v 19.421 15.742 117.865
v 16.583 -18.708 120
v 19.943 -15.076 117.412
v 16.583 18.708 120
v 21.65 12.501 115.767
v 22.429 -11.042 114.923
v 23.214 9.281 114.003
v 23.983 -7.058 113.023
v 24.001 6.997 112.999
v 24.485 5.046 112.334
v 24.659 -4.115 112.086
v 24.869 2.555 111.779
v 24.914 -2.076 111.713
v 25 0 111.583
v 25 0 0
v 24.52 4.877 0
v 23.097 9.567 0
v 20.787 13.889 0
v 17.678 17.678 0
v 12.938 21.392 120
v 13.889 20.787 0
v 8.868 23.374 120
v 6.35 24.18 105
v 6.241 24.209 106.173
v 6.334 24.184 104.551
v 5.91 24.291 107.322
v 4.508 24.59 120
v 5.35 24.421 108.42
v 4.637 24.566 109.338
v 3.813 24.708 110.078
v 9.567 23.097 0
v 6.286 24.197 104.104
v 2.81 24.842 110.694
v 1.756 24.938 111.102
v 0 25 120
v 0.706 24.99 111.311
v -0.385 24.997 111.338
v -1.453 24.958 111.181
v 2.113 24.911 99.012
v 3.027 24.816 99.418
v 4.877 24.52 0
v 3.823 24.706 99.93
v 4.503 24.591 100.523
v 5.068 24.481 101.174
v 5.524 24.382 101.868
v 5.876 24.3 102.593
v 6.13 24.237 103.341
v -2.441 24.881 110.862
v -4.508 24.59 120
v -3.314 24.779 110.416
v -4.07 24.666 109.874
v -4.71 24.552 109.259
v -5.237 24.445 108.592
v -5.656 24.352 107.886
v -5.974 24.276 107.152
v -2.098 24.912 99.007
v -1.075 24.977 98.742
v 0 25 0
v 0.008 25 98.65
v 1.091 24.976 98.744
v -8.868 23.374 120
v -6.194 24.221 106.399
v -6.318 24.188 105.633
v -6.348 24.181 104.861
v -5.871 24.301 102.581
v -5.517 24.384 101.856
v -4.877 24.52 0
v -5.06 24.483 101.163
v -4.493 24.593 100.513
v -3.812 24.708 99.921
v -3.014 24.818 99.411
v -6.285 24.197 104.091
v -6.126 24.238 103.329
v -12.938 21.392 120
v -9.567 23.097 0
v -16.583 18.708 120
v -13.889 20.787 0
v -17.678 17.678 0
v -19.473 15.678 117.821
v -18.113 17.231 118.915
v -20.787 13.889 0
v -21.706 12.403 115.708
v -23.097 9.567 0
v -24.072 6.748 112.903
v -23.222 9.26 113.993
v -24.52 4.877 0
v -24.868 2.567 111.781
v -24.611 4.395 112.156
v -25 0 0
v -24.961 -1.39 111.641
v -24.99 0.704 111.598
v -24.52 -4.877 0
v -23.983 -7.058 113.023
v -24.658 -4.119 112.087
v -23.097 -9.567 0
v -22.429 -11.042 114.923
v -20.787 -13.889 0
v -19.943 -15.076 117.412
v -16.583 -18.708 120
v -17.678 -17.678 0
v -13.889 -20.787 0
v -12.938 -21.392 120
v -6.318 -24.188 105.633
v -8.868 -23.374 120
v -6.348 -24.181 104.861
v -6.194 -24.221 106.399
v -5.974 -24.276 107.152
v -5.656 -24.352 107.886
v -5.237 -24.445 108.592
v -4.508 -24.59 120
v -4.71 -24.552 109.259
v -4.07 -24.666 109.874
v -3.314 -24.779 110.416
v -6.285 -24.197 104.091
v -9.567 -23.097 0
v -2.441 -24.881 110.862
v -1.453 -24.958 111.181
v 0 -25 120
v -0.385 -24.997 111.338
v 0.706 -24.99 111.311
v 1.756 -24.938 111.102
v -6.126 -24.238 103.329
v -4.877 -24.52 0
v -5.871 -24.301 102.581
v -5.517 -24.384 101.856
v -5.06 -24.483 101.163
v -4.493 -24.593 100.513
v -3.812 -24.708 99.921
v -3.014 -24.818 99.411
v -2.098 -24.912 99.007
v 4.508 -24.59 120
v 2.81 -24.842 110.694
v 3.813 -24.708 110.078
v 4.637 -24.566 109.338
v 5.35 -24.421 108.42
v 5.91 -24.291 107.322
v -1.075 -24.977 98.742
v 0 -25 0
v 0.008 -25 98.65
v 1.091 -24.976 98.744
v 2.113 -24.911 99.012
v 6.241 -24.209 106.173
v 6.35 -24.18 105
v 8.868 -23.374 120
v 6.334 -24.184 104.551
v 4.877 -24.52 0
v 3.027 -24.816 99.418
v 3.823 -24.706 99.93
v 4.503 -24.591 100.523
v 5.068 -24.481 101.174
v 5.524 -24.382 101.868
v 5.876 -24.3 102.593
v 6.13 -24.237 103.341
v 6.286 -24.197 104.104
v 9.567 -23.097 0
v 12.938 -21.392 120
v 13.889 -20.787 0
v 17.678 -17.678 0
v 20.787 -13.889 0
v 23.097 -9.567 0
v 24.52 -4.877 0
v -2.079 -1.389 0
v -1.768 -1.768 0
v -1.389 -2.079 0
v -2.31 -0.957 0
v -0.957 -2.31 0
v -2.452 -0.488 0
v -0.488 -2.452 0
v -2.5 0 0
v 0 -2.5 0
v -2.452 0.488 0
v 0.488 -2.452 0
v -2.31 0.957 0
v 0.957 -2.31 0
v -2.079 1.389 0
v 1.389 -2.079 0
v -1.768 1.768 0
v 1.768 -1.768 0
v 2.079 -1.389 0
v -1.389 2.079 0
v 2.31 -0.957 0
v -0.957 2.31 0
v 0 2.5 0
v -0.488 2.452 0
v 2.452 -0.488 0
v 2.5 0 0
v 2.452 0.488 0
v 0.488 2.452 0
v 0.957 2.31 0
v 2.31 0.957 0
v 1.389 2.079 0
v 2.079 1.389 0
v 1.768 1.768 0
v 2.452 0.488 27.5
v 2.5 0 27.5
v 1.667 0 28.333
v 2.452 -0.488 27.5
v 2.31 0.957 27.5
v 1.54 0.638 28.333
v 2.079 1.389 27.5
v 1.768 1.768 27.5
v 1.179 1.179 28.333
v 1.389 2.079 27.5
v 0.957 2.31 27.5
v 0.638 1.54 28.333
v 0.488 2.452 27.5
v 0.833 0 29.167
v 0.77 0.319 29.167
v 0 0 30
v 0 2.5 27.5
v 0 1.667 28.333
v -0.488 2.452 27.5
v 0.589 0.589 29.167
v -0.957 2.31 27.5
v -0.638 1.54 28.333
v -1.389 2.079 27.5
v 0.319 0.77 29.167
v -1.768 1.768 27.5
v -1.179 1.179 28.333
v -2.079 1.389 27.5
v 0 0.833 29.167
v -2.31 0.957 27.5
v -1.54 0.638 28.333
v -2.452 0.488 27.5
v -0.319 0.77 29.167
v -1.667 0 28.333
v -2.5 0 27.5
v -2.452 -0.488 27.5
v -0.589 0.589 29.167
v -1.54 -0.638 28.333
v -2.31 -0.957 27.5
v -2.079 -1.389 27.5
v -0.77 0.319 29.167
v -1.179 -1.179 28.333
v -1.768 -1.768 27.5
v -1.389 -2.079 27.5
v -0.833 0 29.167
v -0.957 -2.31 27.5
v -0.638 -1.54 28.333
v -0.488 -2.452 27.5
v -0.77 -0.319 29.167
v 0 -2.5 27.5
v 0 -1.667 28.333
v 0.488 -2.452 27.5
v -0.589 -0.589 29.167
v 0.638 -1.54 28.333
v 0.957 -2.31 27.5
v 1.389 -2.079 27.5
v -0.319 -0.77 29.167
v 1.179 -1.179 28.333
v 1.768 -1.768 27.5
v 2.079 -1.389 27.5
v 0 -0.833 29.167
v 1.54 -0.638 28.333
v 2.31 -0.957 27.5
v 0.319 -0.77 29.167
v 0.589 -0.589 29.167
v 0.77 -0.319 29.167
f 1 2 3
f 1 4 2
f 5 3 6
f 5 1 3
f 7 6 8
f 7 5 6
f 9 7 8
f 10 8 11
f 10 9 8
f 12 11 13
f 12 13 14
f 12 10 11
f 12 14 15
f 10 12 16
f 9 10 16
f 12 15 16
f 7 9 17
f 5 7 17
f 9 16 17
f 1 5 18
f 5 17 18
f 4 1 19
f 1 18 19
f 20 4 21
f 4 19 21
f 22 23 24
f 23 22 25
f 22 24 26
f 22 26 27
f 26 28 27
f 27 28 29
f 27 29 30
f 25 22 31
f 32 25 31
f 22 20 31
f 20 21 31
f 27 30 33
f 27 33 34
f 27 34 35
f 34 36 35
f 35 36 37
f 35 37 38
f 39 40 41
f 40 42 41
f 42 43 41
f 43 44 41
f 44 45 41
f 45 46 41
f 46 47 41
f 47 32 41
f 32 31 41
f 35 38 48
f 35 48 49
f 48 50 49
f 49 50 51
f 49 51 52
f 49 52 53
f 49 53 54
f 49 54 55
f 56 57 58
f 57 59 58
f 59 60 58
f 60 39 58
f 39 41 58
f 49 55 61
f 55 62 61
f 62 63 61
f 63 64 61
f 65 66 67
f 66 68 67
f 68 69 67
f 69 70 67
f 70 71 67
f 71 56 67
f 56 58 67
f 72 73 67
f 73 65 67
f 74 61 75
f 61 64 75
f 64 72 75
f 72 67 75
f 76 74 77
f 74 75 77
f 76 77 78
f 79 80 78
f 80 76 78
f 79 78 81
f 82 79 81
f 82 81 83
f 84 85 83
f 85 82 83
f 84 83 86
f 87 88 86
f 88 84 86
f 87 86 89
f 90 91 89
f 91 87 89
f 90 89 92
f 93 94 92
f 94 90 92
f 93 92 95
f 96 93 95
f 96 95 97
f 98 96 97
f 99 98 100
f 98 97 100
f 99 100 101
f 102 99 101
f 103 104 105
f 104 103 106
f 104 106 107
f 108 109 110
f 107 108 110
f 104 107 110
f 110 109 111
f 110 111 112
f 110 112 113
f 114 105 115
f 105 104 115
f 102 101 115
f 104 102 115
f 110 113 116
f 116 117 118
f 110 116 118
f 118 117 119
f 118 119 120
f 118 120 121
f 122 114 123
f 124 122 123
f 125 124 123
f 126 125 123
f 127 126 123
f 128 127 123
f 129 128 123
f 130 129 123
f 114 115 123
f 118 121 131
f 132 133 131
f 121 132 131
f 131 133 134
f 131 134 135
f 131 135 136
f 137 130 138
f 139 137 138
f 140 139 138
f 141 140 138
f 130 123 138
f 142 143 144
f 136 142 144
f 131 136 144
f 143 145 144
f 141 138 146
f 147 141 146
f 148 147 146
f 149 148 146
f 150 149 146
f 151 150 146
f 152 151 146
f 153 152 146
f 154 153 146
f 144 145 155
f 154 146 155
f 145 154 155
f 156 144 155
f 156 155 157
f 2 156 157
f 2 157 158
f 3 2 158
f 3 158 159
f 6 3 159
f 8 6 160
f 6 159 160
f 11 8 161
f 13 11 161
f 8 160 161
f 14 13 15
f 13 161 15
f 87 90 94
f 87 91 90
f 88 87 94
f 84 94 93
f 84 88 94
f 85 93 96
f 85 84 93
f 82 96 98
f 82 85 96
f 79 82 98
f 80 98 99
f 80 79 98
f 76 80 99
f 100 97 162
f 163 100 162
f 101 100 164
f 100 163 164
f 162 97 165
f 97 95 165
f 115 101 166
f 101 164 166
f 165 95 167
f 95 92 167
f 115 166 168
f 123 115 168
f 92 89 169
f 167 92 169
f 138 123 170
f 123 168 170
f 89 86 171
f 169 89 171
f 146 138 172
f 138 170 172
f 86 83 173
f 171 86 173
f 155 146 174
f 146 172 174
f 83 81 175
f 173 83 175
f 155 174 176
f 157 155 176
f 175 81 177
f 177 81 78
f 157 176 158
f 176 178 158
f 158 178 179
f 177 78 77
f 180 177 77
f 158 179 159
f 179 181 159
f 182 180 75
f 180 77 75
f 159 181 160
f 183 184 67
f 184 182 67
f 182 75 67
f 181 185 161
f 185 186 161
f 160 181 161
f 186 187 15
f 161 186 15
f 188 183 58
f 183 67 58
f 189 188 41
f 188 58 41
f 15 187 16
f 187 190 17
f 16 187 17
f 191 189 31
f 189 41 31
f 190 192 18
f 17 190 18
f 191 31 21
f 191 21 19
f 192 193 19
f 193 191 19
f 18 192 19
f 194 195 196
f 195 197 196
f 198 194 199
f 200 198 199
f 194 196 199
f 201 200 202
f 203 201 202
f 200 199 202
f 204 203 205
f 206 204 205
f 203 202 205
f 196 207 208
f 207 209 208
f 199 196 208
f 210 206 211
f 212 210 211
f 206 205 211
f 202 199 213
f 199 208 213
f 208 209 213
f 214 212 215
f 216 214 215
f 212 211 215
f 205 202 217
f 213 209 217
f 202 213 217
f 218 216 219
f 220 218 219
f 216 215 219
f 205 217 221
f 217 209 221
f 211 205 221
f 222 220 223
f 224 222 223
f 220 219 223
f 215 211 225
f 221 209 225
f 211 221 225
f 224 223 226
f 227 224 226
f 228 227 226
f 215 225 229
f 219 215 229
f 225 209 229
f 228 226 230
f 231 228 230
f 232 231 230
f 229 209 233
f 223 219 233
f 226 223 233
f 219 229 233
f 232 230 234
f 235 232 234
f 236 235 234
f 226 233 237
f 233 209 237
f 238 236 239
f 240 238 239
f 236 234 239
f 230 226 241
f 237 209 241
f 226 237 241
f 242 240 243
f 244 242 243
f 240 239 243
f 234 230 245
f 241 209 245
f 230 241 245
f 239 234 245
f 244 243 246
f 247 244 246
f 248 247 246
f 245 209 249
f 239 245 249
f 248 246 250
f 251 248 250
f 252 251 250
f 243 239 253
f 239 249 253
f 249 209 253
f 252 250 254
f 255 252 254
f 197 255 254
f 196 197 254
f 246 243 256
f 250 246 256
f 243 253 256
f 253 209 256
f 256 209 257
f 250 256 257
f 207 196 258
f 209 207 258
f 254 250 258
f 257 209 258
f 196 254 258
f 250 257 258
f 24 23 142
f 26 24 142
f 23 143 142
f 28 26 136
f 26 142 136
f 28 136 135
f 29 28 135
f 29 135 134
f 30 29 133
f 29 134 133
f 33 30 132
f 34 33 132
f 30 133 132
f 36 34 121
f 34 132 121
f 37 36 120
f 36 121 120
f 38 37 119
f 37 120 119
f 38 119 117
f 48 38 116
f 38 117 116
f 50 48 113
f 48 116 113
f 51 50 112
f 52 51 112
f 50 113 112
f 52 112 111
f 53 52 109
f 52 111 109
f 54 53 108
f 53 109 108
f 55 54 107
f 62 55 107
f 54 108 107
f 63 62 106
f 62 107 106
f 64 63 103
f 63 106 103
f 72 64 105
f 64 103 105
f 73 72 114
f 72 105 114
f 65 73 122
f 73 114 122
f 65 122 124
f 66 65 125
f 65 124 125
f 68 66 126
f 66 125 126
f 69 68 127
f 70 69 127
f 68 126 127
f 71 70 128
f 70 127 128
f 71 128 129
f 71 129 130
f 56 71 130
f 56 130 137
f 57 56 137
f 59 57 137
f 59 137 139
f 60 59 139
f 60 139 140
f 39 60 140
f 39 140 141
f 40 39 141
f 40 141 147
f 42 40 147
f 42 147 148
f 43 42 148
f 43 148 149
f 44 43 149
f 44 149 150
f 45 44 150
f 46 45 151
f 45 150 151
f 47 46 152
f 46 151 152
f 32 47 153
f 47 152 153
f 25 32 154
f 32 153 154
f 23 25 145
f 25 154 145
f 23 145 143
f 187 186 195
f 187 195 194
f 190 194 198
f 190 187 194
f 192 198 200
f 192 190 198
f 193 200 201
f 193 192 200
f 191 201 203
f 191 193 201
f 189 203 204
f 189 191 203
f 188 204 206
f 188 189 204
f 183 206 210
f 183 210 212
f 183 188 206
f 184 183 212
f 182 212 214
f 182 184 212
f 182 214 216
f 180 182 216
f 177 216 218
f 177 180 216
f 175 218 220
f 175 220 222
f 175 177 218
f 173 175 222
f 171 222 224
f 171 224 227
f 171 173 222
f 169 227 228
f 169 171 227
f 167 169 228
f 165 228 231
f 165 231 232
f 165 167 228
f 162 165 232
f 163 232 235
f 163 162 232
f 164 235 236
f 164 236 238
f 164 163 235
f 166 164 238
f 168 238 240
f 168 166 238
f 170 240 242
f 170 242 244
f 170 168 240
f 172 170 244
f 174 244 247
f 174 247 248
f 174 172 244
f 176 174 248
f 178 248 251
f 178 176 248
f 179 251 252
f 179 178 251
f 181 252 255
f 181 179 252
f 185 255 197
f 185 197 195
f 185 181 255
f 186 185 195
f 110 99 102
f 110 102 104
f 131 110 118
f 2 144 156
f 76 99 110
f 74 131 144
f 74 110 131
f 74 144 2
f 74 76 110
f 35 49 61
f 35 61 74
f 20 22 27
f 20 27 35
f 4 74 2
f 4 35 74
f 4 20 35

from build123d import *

# Parameters (mm, degrees)
F0_R          = 25
F0_R_2        = 2.5
F1_DEPTH      = 120
F2_DEPTH      = 30
F3_SIZE       = 2.5
F4_R          = 6.35
F5_DEPTH      = 25.001
F5_DEPTH_BACK = 25


with BuildPart() as f1:
    # F0 (on Top) → F1 (new body)
    with BuildSketch(Plane.XY):
        Circle(F0_R)
        Circle(F0_R_2, mode=Mode.SUBTRACT)
        Circle(F0_R_2)
    extrude(amount=F1_DEPTH)

    # F0 (on Top) → F2 (cut)
    with BuildSketch(Plane.XY):
        Circle(F0_R_2)
    extrude(amount=F2_DEPTH, mode=Mode.SUBTRACT)

    # F3
    f3_edges = [f1.edges().sort_by_distance(p)[0] for p in [
        (-2.5, 0, 30),
    ]]
    chamfer(f3_edges, length=F3_SIZE)

    # F4 (on Front) → F5 (cut, two sides)
    with BuildSketch(Plane.XZ) as f5_sk:
        with Locations((0, 105)):
            Circle(F4_R)
        with BuildLine():
            ThreePointArc((-30, 95), (0, 125), (30, 95))
            Line((30, 95), (51.988307, 95))
            Line((51.988307, 95), (51.988307, 154.9235))
            Line((51.988307, 154.9235), (-49.441047, 154.9235))
            Line((-49.441047, 154.9235), (-49.441047, 95))
            Line((-49.441047, 95), (-30, 95))
        make_face()
    extrude(amount=F5_DEPTH, mode=Mode.SUBTRACT)
    extrude(f5_sk.sketch, amount=-F5_DEPTH_BACK, mode=Mode.SUBTRACT)


solid = f1.part
